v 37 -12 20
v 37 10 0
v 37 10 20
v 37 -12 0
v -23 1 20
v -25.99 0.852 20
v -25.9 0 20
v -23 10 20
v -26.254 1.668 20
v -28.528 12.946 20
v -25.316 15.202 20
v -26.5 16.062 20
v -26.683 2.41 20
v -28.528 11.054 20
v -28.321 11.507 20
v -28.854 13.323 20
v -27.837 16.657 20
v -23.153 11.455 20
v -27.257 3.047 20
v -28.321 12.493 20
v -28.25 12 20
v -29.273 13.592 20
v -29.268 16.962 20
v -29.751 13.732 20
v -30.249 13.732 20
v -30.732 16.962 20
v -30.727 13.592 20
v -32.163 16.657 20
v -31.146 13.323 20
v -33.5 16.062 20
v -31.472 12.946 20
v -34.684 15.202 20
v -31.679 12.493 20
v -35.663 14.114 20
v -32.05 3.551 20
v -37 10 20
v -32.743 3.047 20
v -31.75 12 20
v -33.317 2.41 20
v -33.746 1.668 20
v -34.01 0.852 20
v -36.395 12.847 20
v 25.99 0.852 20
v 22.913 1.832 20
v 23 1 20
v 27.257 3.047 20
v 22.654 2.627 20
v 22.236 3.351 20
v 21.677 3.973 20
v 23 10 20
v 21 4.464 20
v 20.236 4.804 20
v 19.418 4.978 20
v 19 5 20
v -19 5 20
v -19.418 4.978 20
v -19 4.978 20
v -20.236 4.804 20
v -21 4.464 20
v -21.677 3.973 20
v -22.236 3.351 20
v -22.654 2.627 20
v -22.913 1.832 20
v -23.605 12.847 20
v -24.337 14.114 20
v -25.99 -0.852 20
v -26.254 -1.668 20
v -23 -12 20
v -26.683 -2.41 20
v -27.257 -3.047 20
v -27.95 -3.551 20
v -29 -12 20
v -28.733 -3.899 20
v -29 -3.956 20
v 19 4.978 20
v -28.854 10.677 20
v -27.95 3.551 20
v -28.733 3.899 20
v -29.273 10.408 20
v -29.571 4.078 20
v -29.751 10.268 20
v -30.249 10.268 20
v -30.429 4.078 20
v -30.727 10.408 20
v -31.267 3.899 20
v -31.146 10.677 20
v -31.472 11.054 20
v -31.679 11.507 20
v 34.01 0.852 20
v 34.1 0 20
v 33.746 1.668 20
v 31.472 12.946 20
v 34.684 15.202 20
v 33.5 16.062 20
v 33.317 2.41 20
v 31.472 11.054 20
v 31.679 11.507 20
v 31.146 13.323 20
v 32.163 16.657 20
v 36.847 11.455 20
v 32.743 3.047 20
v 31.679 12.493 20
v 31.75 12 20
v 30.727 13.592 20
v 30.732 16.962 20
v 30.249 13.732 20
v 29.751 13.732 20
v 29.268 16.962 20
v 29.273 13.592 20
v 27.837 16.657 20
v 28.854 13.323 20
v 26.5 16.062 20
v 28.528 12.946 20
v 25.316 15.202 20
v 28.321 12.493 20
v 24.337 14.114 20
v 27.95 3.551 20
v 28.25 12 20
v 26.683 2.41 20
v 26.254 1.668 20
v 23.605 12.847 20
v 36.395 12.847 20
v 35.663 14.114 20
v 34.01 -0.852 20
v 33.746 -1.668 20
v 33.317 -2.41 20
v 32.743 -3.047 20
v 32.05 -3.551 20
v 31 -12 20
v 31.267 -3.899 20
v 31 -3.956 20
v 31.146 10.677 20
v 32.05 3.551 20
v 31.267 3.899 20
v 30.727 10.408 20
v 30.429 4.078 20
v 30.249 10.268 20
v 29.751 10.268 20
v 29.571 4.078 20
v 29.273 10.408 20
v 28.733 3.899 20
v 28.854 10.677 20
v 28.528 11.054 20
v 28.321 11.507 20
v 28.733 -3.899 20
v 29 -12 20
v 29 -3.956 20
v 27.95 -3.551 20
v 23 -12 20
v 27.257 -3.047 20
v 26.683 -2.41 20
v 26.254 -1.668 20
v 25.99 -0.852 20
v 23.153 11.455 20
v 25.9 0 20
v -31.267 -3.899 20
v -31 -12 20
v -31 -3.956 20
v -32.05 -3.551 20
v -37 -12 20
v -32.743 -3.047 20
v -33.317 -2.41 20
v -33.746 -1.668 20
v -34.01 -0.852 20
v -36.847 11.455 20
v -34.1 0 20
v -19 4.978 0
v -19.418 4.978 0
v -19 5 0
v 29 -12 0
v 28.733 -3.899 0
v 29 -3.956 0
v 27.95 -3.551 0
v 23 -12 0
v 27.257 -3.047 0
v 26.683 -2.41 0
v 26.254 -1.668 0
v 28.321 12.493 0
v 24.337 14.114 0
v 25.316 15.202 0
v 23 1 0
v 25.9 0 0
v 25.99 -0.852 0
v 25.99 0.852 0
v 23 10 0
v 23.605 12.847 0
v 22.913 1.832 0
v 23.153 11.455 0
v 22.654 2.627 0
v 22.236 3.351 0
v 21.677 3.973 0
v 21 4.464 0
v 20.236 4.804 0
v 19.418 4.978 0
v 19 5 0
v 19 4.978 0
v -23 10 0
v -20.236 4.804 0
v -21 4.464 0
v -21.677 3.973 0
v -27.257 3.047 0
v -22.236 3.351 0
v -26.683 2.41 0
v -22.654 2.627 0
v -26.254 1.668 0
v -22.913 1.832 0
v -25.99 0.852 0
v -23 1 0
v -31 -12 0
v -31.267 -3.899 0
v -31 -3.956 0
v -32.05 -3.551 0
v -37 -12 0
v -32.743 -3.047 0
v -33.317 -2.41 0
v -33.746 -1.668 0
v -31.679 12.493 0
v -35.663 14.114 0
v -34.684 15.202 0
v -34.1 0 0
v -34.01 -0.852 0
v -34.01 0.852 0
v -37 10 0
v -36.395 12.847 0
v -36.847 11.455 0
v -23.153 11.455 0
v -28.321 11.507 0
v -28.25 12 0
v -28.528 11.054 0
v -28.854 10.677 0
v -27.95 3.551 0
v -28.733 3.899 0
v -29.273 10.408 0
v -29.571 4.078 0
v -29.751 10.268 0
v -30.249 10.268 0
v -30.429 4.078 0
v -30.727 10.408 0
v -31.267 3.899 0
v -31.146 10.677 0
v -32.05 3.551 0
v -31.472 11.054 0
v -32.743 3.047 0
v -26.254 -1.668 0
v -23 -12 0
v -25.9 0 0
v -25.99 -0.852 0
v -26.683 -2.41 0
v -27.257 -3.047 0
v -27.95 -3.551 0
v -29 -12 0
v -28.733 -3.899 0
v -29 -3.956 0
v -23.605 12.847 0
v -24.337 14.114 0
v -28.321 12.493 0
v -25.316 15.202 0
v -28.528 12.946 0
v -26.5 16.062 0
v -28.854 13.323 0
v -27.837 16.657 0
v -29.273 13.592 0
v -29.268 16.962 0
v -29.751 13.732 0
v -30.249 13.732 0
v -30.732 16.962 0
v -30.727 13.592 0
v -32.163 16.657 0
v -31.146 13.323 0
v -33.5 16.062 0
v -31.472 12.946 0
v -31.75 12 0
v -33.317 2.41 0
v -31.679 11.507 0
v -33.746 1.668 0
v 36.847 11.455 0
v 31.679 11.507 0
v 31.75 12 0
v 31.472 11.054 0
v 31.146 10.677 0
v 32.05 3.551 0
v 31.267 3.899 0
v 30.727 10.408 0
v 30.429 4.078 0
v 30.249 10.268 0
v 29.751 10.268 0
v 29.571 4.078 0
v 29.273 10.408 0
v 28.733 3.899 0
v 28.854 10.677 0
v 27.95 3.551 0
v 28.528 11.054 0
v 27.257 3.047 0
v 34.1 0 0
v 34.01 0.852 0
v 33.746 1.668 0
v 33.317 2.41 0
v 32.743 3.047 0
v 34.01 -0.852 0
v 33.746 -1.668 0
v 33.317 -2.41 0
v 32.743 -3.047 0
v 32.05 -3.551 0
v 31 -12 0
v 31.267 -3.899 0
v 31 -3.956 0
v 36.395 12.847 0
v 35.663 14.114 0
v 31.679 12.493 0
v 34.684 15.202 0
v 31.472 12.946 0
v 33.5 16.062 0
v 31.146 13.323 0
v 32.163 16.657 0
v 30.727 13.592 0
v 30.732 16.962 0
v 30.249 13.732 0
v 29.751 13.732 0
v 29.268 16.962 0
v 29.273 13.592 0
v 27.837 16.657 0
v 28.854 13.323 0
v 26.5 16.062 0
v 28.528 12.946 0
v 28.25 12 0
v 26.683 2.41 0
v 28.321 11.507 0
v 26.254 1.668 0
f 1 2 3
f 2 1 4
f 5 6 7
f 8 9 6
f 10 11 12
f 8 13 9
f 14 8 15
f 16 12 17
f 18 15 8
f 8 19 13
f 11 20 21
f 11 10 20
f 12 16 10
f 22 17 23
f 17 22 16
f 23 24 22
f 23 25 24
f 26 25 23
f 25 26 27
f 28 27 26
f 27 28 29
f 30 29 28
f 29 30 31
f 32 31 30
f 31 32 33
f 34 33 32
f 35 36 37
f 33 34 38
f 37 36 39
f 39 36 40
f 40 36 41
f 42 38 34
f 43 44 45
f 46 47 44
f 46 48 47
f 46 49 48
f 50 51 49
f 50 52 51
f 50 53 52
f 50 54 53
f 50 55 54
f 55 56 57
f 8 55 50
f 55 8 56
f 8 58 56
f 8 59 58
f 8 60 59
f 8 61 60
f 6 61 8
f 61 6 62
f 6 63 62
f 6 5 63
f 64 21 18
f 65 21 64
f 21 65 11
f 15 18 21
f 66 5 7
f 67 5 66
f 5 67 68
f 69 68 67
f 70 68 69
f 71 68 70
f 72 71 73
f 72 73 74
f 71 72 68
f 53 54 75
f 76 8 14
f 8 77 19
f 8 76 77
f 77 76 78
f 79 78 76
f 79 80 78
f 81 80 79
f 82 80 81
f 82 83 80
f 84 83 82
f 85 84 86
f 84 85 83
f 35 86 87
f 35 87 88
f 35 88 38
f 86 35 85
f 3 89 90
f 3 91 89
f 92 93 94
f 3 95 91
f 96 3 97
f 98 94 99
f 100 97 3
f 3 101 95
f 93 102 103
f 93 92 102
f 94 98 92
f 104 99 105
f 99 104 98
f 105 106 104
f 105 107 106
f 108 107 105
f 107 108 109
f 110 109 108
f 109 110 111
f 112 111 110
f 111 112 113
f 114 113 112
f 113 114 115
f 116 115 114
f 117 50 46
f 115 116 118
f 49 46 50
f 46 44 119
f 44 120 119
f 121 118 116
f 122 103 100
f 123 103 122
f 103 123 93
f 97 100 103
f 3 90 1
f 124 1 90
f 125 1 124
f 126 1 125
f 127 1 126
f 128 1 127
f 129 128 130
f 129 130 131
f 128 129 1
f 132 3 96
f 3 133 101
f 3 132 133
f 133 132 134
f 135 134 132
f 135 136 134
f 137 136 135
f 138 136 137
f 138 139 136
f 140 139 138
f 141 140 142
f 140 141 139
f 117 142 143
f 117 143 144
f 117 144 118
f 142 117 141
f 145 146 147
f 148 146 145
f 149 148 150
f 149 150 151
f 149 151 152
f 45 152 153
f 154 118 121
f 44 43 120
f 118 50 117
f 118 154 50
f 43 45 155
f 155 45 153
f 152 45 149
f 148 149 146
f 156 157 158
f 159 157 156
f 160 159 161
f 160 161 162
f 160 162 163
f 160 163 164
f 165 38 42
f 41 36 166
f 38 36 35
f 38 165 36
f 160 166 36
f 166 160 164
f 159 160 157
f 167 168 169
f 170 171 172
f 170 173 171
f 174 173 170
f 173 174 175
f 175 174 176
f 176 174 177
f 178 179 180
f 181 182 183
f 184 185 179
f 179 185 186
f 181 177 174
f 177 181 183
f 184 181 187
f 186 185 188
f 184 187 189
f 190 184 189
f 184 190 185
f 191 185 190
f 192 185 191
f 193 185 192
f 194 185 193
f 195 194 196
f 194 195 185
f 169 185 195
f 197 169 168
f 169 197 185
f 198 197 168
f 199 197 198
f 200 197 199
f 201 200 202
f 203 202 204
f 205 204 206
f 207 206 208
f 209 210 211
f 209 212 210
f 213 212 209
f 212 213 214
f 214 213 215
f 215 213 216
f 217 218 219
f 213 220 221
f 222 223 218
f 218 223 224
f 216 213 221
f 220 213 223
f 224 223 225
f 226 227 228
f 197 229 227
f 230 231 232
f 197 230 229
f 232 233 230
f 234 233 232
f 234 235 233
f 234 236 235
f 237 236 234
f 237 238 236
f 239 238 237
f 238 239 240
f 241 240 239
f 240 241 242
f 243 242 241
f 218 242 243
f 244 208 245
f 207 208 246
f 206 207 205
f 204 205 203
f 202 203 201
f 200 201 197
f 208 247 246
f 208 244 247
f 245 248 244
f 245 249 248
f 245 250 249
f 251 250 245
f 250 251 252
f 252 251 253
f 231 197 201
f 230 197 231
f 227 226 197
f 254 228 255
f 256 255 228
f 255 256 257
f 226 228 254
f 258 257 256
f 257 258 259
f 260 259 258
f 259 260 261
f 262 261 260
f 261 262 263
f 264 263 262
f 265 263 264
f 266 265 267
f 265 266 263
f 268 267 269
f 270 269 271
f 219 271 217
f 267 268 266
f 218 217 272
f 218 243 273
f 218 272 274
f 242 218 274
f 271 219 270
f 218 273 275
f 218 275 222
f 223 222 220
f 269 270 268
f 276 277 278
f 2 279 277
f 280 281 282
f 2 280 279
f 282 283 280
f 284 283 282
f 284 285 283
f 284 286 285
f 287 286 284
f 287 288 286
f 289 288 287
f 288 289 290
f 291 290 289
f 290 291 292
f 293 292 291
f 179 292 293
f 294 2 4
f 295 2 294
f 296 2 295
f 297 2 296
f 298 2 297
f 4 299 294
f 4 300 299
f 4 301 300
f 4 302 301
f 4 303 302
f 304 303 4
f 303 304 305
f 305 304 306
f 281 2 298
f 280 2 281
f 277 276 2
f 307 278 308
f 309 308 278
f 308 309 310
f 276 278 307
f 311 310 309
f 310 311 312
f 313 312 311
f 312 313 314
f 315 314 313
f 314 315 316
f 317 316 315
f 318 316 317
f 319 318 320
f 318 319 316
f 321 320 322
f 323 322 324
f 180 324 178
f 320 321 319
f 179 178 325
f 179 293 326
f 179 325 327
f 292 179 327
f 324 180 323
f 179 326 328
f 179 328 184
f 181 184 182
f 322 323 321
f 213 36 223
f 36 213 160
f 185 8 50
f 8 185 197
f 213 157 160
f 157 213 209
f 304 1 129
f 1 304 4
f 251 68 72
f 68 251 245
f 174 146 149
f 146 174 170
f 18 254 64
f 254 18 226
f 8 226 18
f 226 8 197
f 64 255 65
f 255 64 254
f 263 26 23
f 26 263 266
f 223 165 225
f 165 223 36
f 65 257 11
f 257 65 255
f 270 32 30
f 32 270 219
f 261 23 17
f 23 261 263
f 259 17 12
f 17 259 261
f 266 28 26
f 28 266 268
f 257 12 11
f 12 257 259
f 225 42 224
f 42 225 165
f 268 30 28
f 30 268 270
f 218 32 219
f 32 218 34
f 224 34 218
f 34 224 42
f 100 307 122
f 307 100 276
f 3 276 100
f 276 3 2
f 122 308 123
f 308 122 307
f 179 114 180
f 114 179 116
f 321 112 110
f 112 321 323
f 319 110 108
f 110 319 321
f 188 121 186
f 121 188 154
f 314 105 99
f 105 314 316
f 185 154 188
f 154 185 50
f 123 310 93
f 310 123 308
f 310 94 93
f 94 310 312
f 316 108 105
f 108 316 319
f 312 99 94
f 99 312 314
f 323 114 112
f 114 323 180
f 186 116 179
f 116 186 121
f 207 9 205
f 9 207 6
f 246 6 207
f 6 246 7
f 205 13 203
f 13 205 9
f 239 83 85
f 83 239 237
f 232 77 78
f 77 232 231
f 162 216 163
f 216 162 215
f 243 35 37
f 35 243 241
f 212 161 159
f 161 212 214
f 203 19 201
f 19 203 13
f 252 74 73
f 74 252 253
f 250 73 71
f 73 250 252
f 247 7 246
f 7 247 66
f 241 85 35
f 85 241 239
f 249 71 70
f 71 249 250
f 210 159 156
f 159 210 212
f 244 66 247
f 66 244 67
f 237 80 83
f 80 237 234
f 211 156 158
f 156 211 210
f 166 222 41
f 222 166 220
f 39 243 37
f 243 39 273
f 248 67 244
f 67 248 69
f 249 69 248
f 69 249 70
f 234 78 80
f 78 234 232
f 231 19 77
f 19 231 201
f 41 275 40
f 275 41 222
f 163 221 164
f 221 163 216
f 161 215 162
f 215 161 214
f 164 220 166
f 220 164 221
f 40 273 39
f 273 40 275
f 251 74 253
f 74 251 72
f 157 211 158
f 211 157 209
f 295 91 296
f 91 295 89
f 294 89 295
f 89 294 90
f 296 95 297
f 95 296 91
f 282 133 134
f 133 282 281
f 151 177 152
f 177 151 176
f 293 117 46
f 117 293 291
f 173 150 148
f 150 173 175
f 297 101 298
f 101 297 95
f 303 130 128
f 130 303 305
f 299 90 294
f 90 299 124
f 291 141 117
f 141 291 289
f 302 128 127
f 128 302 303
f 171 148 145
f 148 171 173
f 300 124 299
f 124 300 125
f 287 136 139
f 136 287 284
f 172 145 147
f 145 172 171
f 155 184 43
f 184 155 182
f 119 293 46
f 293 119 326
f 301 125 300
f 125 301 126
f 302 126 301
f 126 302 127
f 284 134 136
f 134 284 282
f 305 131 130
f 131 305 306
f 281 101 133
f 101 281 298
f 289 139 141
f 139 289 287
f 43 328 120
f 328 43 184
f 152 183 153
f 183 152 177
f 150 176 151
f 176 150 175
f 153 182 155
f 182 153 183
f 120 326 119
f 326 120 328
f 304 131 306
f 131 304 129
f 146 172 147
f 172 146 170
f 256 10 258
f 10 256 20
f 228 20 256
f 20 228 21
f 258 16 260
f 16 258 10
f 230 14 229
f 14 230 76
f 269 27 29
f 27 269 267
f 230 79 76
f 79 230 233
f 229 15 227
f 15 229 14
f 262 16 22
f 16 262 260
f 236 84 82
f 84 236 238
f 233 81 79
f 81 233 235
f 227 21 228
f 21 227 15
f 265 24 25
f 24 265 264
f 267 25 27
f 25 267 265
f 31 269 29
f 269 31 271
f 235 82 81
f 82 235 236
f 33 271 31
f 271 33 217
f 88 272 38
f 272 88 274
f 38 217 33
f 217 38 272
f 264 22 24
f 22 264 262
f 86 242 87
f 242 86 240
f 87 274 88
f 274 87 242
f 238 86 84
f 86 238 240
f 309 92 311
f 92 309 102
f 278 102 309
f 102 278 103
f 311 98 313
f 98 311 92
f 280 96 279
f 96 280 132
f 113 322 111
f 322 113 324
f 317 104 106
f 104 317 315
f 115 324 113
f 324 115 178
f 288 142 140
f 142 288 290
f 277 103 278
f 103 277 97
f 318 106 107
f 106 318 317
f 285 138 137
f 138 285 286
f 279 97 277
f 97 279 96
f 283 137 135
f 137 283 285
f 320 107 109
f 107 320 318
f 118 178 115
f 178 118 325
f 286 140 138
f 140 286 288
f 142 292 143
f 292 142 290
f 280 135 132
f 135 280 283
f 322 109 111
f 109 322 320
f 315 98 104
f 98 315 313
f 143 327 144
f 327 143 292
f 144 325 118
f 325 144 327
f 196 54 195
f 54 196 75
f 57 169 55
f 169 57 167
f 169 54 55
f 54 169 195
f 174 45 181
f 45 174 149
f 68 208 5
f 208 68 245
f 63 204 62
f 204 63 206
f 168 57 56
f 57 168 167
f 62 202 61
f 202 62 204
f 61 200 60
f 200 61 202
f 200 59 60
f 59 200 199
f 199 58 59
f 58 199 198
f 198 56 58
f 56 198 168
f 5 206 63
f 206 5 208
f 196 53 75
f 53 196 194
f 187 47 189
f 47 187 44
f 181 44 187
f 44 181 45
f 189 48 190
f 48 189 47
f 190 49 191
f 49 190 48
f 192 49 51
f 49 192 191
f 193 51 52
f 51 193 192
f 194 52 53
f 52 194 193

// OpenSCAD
// file: configuration.scad
debug = 0;
vitamins = 0;

idler_end_height=28;
motor_end_height=44;
platform_thickness=8;
arm_distance=50;
platform_hinge_offset=33;
carriage_offset=22;
smooth_rod_distance=60;
smooth_rod_dia=8;
linear_bearing_height=24;
linear_bearing_dia=15.1; // must be wider than bearing and adjust for printer
// main file
include <configuration.scad>
$fa = 12;
$fs = 0.5;

w = smooth_rod_distance; // Smooth rod distance (center to center)

module screws() {
	for (x = [-w/2, w/2]) {
		translate([x, 0, 0]) {
			// Push-through M3 screw hole.
			translate([0, -6, 0]) rotate([0, 90, 0]) cylinder(r=1.6, h=20, center=true);
			// M3 nut holder.
			translate([-x/5, -6, 0]) rotate([30, 0, 0]) rotate([0, 90, 0]) cylinder(r=3.1, h=2.3, center=true, $fn=6);
		}
	}
}

module bracket(h) {
	difference() {
		union() {
			translate([0, -1, 0]) cube([w+14, 22, h], center=true);
			// Sandwich mount.
			translate([-w/2, 10, 0]) cylinder(r=7, h=h, center=true);
			translate([w/2, 10, 0]) cylinder(r=7, h=h, center=true);
		}
		
		// Sandwich mount.
		translate([-w/2, 12, 0]) cylinder(r=1.75, h=h+1, center=true);
		translate([w/2, 12, 0]) cylinder(r=1.75, h=h+1, center=true);
		
		// Smooth rod mounting slots.
		for (x = [-w/2, w/2]) {
			translate([x, 0, 0]) {
				cylinder(r=4.1, h=h+1, center=true);
				translate([0, -10, 0]) cube([2, 20, h+1], center=true);
			}
		}
		
		// Belt path.
		translate([0, -5, 0]) cube([w-22, 20, h+1], center=true);
		translate([0, -9, 0]) cube([w-14, 20, h+1], center=true);
		translate([-w/2+11, 1, 0]) cylinder(r=4, h=h+1, center=true);
		translate([w/2-11, 1, 0]) cylinder(r=4, h=h+1, center=true);
  }
}

translate([0, 0, 10]) bracket(20);
